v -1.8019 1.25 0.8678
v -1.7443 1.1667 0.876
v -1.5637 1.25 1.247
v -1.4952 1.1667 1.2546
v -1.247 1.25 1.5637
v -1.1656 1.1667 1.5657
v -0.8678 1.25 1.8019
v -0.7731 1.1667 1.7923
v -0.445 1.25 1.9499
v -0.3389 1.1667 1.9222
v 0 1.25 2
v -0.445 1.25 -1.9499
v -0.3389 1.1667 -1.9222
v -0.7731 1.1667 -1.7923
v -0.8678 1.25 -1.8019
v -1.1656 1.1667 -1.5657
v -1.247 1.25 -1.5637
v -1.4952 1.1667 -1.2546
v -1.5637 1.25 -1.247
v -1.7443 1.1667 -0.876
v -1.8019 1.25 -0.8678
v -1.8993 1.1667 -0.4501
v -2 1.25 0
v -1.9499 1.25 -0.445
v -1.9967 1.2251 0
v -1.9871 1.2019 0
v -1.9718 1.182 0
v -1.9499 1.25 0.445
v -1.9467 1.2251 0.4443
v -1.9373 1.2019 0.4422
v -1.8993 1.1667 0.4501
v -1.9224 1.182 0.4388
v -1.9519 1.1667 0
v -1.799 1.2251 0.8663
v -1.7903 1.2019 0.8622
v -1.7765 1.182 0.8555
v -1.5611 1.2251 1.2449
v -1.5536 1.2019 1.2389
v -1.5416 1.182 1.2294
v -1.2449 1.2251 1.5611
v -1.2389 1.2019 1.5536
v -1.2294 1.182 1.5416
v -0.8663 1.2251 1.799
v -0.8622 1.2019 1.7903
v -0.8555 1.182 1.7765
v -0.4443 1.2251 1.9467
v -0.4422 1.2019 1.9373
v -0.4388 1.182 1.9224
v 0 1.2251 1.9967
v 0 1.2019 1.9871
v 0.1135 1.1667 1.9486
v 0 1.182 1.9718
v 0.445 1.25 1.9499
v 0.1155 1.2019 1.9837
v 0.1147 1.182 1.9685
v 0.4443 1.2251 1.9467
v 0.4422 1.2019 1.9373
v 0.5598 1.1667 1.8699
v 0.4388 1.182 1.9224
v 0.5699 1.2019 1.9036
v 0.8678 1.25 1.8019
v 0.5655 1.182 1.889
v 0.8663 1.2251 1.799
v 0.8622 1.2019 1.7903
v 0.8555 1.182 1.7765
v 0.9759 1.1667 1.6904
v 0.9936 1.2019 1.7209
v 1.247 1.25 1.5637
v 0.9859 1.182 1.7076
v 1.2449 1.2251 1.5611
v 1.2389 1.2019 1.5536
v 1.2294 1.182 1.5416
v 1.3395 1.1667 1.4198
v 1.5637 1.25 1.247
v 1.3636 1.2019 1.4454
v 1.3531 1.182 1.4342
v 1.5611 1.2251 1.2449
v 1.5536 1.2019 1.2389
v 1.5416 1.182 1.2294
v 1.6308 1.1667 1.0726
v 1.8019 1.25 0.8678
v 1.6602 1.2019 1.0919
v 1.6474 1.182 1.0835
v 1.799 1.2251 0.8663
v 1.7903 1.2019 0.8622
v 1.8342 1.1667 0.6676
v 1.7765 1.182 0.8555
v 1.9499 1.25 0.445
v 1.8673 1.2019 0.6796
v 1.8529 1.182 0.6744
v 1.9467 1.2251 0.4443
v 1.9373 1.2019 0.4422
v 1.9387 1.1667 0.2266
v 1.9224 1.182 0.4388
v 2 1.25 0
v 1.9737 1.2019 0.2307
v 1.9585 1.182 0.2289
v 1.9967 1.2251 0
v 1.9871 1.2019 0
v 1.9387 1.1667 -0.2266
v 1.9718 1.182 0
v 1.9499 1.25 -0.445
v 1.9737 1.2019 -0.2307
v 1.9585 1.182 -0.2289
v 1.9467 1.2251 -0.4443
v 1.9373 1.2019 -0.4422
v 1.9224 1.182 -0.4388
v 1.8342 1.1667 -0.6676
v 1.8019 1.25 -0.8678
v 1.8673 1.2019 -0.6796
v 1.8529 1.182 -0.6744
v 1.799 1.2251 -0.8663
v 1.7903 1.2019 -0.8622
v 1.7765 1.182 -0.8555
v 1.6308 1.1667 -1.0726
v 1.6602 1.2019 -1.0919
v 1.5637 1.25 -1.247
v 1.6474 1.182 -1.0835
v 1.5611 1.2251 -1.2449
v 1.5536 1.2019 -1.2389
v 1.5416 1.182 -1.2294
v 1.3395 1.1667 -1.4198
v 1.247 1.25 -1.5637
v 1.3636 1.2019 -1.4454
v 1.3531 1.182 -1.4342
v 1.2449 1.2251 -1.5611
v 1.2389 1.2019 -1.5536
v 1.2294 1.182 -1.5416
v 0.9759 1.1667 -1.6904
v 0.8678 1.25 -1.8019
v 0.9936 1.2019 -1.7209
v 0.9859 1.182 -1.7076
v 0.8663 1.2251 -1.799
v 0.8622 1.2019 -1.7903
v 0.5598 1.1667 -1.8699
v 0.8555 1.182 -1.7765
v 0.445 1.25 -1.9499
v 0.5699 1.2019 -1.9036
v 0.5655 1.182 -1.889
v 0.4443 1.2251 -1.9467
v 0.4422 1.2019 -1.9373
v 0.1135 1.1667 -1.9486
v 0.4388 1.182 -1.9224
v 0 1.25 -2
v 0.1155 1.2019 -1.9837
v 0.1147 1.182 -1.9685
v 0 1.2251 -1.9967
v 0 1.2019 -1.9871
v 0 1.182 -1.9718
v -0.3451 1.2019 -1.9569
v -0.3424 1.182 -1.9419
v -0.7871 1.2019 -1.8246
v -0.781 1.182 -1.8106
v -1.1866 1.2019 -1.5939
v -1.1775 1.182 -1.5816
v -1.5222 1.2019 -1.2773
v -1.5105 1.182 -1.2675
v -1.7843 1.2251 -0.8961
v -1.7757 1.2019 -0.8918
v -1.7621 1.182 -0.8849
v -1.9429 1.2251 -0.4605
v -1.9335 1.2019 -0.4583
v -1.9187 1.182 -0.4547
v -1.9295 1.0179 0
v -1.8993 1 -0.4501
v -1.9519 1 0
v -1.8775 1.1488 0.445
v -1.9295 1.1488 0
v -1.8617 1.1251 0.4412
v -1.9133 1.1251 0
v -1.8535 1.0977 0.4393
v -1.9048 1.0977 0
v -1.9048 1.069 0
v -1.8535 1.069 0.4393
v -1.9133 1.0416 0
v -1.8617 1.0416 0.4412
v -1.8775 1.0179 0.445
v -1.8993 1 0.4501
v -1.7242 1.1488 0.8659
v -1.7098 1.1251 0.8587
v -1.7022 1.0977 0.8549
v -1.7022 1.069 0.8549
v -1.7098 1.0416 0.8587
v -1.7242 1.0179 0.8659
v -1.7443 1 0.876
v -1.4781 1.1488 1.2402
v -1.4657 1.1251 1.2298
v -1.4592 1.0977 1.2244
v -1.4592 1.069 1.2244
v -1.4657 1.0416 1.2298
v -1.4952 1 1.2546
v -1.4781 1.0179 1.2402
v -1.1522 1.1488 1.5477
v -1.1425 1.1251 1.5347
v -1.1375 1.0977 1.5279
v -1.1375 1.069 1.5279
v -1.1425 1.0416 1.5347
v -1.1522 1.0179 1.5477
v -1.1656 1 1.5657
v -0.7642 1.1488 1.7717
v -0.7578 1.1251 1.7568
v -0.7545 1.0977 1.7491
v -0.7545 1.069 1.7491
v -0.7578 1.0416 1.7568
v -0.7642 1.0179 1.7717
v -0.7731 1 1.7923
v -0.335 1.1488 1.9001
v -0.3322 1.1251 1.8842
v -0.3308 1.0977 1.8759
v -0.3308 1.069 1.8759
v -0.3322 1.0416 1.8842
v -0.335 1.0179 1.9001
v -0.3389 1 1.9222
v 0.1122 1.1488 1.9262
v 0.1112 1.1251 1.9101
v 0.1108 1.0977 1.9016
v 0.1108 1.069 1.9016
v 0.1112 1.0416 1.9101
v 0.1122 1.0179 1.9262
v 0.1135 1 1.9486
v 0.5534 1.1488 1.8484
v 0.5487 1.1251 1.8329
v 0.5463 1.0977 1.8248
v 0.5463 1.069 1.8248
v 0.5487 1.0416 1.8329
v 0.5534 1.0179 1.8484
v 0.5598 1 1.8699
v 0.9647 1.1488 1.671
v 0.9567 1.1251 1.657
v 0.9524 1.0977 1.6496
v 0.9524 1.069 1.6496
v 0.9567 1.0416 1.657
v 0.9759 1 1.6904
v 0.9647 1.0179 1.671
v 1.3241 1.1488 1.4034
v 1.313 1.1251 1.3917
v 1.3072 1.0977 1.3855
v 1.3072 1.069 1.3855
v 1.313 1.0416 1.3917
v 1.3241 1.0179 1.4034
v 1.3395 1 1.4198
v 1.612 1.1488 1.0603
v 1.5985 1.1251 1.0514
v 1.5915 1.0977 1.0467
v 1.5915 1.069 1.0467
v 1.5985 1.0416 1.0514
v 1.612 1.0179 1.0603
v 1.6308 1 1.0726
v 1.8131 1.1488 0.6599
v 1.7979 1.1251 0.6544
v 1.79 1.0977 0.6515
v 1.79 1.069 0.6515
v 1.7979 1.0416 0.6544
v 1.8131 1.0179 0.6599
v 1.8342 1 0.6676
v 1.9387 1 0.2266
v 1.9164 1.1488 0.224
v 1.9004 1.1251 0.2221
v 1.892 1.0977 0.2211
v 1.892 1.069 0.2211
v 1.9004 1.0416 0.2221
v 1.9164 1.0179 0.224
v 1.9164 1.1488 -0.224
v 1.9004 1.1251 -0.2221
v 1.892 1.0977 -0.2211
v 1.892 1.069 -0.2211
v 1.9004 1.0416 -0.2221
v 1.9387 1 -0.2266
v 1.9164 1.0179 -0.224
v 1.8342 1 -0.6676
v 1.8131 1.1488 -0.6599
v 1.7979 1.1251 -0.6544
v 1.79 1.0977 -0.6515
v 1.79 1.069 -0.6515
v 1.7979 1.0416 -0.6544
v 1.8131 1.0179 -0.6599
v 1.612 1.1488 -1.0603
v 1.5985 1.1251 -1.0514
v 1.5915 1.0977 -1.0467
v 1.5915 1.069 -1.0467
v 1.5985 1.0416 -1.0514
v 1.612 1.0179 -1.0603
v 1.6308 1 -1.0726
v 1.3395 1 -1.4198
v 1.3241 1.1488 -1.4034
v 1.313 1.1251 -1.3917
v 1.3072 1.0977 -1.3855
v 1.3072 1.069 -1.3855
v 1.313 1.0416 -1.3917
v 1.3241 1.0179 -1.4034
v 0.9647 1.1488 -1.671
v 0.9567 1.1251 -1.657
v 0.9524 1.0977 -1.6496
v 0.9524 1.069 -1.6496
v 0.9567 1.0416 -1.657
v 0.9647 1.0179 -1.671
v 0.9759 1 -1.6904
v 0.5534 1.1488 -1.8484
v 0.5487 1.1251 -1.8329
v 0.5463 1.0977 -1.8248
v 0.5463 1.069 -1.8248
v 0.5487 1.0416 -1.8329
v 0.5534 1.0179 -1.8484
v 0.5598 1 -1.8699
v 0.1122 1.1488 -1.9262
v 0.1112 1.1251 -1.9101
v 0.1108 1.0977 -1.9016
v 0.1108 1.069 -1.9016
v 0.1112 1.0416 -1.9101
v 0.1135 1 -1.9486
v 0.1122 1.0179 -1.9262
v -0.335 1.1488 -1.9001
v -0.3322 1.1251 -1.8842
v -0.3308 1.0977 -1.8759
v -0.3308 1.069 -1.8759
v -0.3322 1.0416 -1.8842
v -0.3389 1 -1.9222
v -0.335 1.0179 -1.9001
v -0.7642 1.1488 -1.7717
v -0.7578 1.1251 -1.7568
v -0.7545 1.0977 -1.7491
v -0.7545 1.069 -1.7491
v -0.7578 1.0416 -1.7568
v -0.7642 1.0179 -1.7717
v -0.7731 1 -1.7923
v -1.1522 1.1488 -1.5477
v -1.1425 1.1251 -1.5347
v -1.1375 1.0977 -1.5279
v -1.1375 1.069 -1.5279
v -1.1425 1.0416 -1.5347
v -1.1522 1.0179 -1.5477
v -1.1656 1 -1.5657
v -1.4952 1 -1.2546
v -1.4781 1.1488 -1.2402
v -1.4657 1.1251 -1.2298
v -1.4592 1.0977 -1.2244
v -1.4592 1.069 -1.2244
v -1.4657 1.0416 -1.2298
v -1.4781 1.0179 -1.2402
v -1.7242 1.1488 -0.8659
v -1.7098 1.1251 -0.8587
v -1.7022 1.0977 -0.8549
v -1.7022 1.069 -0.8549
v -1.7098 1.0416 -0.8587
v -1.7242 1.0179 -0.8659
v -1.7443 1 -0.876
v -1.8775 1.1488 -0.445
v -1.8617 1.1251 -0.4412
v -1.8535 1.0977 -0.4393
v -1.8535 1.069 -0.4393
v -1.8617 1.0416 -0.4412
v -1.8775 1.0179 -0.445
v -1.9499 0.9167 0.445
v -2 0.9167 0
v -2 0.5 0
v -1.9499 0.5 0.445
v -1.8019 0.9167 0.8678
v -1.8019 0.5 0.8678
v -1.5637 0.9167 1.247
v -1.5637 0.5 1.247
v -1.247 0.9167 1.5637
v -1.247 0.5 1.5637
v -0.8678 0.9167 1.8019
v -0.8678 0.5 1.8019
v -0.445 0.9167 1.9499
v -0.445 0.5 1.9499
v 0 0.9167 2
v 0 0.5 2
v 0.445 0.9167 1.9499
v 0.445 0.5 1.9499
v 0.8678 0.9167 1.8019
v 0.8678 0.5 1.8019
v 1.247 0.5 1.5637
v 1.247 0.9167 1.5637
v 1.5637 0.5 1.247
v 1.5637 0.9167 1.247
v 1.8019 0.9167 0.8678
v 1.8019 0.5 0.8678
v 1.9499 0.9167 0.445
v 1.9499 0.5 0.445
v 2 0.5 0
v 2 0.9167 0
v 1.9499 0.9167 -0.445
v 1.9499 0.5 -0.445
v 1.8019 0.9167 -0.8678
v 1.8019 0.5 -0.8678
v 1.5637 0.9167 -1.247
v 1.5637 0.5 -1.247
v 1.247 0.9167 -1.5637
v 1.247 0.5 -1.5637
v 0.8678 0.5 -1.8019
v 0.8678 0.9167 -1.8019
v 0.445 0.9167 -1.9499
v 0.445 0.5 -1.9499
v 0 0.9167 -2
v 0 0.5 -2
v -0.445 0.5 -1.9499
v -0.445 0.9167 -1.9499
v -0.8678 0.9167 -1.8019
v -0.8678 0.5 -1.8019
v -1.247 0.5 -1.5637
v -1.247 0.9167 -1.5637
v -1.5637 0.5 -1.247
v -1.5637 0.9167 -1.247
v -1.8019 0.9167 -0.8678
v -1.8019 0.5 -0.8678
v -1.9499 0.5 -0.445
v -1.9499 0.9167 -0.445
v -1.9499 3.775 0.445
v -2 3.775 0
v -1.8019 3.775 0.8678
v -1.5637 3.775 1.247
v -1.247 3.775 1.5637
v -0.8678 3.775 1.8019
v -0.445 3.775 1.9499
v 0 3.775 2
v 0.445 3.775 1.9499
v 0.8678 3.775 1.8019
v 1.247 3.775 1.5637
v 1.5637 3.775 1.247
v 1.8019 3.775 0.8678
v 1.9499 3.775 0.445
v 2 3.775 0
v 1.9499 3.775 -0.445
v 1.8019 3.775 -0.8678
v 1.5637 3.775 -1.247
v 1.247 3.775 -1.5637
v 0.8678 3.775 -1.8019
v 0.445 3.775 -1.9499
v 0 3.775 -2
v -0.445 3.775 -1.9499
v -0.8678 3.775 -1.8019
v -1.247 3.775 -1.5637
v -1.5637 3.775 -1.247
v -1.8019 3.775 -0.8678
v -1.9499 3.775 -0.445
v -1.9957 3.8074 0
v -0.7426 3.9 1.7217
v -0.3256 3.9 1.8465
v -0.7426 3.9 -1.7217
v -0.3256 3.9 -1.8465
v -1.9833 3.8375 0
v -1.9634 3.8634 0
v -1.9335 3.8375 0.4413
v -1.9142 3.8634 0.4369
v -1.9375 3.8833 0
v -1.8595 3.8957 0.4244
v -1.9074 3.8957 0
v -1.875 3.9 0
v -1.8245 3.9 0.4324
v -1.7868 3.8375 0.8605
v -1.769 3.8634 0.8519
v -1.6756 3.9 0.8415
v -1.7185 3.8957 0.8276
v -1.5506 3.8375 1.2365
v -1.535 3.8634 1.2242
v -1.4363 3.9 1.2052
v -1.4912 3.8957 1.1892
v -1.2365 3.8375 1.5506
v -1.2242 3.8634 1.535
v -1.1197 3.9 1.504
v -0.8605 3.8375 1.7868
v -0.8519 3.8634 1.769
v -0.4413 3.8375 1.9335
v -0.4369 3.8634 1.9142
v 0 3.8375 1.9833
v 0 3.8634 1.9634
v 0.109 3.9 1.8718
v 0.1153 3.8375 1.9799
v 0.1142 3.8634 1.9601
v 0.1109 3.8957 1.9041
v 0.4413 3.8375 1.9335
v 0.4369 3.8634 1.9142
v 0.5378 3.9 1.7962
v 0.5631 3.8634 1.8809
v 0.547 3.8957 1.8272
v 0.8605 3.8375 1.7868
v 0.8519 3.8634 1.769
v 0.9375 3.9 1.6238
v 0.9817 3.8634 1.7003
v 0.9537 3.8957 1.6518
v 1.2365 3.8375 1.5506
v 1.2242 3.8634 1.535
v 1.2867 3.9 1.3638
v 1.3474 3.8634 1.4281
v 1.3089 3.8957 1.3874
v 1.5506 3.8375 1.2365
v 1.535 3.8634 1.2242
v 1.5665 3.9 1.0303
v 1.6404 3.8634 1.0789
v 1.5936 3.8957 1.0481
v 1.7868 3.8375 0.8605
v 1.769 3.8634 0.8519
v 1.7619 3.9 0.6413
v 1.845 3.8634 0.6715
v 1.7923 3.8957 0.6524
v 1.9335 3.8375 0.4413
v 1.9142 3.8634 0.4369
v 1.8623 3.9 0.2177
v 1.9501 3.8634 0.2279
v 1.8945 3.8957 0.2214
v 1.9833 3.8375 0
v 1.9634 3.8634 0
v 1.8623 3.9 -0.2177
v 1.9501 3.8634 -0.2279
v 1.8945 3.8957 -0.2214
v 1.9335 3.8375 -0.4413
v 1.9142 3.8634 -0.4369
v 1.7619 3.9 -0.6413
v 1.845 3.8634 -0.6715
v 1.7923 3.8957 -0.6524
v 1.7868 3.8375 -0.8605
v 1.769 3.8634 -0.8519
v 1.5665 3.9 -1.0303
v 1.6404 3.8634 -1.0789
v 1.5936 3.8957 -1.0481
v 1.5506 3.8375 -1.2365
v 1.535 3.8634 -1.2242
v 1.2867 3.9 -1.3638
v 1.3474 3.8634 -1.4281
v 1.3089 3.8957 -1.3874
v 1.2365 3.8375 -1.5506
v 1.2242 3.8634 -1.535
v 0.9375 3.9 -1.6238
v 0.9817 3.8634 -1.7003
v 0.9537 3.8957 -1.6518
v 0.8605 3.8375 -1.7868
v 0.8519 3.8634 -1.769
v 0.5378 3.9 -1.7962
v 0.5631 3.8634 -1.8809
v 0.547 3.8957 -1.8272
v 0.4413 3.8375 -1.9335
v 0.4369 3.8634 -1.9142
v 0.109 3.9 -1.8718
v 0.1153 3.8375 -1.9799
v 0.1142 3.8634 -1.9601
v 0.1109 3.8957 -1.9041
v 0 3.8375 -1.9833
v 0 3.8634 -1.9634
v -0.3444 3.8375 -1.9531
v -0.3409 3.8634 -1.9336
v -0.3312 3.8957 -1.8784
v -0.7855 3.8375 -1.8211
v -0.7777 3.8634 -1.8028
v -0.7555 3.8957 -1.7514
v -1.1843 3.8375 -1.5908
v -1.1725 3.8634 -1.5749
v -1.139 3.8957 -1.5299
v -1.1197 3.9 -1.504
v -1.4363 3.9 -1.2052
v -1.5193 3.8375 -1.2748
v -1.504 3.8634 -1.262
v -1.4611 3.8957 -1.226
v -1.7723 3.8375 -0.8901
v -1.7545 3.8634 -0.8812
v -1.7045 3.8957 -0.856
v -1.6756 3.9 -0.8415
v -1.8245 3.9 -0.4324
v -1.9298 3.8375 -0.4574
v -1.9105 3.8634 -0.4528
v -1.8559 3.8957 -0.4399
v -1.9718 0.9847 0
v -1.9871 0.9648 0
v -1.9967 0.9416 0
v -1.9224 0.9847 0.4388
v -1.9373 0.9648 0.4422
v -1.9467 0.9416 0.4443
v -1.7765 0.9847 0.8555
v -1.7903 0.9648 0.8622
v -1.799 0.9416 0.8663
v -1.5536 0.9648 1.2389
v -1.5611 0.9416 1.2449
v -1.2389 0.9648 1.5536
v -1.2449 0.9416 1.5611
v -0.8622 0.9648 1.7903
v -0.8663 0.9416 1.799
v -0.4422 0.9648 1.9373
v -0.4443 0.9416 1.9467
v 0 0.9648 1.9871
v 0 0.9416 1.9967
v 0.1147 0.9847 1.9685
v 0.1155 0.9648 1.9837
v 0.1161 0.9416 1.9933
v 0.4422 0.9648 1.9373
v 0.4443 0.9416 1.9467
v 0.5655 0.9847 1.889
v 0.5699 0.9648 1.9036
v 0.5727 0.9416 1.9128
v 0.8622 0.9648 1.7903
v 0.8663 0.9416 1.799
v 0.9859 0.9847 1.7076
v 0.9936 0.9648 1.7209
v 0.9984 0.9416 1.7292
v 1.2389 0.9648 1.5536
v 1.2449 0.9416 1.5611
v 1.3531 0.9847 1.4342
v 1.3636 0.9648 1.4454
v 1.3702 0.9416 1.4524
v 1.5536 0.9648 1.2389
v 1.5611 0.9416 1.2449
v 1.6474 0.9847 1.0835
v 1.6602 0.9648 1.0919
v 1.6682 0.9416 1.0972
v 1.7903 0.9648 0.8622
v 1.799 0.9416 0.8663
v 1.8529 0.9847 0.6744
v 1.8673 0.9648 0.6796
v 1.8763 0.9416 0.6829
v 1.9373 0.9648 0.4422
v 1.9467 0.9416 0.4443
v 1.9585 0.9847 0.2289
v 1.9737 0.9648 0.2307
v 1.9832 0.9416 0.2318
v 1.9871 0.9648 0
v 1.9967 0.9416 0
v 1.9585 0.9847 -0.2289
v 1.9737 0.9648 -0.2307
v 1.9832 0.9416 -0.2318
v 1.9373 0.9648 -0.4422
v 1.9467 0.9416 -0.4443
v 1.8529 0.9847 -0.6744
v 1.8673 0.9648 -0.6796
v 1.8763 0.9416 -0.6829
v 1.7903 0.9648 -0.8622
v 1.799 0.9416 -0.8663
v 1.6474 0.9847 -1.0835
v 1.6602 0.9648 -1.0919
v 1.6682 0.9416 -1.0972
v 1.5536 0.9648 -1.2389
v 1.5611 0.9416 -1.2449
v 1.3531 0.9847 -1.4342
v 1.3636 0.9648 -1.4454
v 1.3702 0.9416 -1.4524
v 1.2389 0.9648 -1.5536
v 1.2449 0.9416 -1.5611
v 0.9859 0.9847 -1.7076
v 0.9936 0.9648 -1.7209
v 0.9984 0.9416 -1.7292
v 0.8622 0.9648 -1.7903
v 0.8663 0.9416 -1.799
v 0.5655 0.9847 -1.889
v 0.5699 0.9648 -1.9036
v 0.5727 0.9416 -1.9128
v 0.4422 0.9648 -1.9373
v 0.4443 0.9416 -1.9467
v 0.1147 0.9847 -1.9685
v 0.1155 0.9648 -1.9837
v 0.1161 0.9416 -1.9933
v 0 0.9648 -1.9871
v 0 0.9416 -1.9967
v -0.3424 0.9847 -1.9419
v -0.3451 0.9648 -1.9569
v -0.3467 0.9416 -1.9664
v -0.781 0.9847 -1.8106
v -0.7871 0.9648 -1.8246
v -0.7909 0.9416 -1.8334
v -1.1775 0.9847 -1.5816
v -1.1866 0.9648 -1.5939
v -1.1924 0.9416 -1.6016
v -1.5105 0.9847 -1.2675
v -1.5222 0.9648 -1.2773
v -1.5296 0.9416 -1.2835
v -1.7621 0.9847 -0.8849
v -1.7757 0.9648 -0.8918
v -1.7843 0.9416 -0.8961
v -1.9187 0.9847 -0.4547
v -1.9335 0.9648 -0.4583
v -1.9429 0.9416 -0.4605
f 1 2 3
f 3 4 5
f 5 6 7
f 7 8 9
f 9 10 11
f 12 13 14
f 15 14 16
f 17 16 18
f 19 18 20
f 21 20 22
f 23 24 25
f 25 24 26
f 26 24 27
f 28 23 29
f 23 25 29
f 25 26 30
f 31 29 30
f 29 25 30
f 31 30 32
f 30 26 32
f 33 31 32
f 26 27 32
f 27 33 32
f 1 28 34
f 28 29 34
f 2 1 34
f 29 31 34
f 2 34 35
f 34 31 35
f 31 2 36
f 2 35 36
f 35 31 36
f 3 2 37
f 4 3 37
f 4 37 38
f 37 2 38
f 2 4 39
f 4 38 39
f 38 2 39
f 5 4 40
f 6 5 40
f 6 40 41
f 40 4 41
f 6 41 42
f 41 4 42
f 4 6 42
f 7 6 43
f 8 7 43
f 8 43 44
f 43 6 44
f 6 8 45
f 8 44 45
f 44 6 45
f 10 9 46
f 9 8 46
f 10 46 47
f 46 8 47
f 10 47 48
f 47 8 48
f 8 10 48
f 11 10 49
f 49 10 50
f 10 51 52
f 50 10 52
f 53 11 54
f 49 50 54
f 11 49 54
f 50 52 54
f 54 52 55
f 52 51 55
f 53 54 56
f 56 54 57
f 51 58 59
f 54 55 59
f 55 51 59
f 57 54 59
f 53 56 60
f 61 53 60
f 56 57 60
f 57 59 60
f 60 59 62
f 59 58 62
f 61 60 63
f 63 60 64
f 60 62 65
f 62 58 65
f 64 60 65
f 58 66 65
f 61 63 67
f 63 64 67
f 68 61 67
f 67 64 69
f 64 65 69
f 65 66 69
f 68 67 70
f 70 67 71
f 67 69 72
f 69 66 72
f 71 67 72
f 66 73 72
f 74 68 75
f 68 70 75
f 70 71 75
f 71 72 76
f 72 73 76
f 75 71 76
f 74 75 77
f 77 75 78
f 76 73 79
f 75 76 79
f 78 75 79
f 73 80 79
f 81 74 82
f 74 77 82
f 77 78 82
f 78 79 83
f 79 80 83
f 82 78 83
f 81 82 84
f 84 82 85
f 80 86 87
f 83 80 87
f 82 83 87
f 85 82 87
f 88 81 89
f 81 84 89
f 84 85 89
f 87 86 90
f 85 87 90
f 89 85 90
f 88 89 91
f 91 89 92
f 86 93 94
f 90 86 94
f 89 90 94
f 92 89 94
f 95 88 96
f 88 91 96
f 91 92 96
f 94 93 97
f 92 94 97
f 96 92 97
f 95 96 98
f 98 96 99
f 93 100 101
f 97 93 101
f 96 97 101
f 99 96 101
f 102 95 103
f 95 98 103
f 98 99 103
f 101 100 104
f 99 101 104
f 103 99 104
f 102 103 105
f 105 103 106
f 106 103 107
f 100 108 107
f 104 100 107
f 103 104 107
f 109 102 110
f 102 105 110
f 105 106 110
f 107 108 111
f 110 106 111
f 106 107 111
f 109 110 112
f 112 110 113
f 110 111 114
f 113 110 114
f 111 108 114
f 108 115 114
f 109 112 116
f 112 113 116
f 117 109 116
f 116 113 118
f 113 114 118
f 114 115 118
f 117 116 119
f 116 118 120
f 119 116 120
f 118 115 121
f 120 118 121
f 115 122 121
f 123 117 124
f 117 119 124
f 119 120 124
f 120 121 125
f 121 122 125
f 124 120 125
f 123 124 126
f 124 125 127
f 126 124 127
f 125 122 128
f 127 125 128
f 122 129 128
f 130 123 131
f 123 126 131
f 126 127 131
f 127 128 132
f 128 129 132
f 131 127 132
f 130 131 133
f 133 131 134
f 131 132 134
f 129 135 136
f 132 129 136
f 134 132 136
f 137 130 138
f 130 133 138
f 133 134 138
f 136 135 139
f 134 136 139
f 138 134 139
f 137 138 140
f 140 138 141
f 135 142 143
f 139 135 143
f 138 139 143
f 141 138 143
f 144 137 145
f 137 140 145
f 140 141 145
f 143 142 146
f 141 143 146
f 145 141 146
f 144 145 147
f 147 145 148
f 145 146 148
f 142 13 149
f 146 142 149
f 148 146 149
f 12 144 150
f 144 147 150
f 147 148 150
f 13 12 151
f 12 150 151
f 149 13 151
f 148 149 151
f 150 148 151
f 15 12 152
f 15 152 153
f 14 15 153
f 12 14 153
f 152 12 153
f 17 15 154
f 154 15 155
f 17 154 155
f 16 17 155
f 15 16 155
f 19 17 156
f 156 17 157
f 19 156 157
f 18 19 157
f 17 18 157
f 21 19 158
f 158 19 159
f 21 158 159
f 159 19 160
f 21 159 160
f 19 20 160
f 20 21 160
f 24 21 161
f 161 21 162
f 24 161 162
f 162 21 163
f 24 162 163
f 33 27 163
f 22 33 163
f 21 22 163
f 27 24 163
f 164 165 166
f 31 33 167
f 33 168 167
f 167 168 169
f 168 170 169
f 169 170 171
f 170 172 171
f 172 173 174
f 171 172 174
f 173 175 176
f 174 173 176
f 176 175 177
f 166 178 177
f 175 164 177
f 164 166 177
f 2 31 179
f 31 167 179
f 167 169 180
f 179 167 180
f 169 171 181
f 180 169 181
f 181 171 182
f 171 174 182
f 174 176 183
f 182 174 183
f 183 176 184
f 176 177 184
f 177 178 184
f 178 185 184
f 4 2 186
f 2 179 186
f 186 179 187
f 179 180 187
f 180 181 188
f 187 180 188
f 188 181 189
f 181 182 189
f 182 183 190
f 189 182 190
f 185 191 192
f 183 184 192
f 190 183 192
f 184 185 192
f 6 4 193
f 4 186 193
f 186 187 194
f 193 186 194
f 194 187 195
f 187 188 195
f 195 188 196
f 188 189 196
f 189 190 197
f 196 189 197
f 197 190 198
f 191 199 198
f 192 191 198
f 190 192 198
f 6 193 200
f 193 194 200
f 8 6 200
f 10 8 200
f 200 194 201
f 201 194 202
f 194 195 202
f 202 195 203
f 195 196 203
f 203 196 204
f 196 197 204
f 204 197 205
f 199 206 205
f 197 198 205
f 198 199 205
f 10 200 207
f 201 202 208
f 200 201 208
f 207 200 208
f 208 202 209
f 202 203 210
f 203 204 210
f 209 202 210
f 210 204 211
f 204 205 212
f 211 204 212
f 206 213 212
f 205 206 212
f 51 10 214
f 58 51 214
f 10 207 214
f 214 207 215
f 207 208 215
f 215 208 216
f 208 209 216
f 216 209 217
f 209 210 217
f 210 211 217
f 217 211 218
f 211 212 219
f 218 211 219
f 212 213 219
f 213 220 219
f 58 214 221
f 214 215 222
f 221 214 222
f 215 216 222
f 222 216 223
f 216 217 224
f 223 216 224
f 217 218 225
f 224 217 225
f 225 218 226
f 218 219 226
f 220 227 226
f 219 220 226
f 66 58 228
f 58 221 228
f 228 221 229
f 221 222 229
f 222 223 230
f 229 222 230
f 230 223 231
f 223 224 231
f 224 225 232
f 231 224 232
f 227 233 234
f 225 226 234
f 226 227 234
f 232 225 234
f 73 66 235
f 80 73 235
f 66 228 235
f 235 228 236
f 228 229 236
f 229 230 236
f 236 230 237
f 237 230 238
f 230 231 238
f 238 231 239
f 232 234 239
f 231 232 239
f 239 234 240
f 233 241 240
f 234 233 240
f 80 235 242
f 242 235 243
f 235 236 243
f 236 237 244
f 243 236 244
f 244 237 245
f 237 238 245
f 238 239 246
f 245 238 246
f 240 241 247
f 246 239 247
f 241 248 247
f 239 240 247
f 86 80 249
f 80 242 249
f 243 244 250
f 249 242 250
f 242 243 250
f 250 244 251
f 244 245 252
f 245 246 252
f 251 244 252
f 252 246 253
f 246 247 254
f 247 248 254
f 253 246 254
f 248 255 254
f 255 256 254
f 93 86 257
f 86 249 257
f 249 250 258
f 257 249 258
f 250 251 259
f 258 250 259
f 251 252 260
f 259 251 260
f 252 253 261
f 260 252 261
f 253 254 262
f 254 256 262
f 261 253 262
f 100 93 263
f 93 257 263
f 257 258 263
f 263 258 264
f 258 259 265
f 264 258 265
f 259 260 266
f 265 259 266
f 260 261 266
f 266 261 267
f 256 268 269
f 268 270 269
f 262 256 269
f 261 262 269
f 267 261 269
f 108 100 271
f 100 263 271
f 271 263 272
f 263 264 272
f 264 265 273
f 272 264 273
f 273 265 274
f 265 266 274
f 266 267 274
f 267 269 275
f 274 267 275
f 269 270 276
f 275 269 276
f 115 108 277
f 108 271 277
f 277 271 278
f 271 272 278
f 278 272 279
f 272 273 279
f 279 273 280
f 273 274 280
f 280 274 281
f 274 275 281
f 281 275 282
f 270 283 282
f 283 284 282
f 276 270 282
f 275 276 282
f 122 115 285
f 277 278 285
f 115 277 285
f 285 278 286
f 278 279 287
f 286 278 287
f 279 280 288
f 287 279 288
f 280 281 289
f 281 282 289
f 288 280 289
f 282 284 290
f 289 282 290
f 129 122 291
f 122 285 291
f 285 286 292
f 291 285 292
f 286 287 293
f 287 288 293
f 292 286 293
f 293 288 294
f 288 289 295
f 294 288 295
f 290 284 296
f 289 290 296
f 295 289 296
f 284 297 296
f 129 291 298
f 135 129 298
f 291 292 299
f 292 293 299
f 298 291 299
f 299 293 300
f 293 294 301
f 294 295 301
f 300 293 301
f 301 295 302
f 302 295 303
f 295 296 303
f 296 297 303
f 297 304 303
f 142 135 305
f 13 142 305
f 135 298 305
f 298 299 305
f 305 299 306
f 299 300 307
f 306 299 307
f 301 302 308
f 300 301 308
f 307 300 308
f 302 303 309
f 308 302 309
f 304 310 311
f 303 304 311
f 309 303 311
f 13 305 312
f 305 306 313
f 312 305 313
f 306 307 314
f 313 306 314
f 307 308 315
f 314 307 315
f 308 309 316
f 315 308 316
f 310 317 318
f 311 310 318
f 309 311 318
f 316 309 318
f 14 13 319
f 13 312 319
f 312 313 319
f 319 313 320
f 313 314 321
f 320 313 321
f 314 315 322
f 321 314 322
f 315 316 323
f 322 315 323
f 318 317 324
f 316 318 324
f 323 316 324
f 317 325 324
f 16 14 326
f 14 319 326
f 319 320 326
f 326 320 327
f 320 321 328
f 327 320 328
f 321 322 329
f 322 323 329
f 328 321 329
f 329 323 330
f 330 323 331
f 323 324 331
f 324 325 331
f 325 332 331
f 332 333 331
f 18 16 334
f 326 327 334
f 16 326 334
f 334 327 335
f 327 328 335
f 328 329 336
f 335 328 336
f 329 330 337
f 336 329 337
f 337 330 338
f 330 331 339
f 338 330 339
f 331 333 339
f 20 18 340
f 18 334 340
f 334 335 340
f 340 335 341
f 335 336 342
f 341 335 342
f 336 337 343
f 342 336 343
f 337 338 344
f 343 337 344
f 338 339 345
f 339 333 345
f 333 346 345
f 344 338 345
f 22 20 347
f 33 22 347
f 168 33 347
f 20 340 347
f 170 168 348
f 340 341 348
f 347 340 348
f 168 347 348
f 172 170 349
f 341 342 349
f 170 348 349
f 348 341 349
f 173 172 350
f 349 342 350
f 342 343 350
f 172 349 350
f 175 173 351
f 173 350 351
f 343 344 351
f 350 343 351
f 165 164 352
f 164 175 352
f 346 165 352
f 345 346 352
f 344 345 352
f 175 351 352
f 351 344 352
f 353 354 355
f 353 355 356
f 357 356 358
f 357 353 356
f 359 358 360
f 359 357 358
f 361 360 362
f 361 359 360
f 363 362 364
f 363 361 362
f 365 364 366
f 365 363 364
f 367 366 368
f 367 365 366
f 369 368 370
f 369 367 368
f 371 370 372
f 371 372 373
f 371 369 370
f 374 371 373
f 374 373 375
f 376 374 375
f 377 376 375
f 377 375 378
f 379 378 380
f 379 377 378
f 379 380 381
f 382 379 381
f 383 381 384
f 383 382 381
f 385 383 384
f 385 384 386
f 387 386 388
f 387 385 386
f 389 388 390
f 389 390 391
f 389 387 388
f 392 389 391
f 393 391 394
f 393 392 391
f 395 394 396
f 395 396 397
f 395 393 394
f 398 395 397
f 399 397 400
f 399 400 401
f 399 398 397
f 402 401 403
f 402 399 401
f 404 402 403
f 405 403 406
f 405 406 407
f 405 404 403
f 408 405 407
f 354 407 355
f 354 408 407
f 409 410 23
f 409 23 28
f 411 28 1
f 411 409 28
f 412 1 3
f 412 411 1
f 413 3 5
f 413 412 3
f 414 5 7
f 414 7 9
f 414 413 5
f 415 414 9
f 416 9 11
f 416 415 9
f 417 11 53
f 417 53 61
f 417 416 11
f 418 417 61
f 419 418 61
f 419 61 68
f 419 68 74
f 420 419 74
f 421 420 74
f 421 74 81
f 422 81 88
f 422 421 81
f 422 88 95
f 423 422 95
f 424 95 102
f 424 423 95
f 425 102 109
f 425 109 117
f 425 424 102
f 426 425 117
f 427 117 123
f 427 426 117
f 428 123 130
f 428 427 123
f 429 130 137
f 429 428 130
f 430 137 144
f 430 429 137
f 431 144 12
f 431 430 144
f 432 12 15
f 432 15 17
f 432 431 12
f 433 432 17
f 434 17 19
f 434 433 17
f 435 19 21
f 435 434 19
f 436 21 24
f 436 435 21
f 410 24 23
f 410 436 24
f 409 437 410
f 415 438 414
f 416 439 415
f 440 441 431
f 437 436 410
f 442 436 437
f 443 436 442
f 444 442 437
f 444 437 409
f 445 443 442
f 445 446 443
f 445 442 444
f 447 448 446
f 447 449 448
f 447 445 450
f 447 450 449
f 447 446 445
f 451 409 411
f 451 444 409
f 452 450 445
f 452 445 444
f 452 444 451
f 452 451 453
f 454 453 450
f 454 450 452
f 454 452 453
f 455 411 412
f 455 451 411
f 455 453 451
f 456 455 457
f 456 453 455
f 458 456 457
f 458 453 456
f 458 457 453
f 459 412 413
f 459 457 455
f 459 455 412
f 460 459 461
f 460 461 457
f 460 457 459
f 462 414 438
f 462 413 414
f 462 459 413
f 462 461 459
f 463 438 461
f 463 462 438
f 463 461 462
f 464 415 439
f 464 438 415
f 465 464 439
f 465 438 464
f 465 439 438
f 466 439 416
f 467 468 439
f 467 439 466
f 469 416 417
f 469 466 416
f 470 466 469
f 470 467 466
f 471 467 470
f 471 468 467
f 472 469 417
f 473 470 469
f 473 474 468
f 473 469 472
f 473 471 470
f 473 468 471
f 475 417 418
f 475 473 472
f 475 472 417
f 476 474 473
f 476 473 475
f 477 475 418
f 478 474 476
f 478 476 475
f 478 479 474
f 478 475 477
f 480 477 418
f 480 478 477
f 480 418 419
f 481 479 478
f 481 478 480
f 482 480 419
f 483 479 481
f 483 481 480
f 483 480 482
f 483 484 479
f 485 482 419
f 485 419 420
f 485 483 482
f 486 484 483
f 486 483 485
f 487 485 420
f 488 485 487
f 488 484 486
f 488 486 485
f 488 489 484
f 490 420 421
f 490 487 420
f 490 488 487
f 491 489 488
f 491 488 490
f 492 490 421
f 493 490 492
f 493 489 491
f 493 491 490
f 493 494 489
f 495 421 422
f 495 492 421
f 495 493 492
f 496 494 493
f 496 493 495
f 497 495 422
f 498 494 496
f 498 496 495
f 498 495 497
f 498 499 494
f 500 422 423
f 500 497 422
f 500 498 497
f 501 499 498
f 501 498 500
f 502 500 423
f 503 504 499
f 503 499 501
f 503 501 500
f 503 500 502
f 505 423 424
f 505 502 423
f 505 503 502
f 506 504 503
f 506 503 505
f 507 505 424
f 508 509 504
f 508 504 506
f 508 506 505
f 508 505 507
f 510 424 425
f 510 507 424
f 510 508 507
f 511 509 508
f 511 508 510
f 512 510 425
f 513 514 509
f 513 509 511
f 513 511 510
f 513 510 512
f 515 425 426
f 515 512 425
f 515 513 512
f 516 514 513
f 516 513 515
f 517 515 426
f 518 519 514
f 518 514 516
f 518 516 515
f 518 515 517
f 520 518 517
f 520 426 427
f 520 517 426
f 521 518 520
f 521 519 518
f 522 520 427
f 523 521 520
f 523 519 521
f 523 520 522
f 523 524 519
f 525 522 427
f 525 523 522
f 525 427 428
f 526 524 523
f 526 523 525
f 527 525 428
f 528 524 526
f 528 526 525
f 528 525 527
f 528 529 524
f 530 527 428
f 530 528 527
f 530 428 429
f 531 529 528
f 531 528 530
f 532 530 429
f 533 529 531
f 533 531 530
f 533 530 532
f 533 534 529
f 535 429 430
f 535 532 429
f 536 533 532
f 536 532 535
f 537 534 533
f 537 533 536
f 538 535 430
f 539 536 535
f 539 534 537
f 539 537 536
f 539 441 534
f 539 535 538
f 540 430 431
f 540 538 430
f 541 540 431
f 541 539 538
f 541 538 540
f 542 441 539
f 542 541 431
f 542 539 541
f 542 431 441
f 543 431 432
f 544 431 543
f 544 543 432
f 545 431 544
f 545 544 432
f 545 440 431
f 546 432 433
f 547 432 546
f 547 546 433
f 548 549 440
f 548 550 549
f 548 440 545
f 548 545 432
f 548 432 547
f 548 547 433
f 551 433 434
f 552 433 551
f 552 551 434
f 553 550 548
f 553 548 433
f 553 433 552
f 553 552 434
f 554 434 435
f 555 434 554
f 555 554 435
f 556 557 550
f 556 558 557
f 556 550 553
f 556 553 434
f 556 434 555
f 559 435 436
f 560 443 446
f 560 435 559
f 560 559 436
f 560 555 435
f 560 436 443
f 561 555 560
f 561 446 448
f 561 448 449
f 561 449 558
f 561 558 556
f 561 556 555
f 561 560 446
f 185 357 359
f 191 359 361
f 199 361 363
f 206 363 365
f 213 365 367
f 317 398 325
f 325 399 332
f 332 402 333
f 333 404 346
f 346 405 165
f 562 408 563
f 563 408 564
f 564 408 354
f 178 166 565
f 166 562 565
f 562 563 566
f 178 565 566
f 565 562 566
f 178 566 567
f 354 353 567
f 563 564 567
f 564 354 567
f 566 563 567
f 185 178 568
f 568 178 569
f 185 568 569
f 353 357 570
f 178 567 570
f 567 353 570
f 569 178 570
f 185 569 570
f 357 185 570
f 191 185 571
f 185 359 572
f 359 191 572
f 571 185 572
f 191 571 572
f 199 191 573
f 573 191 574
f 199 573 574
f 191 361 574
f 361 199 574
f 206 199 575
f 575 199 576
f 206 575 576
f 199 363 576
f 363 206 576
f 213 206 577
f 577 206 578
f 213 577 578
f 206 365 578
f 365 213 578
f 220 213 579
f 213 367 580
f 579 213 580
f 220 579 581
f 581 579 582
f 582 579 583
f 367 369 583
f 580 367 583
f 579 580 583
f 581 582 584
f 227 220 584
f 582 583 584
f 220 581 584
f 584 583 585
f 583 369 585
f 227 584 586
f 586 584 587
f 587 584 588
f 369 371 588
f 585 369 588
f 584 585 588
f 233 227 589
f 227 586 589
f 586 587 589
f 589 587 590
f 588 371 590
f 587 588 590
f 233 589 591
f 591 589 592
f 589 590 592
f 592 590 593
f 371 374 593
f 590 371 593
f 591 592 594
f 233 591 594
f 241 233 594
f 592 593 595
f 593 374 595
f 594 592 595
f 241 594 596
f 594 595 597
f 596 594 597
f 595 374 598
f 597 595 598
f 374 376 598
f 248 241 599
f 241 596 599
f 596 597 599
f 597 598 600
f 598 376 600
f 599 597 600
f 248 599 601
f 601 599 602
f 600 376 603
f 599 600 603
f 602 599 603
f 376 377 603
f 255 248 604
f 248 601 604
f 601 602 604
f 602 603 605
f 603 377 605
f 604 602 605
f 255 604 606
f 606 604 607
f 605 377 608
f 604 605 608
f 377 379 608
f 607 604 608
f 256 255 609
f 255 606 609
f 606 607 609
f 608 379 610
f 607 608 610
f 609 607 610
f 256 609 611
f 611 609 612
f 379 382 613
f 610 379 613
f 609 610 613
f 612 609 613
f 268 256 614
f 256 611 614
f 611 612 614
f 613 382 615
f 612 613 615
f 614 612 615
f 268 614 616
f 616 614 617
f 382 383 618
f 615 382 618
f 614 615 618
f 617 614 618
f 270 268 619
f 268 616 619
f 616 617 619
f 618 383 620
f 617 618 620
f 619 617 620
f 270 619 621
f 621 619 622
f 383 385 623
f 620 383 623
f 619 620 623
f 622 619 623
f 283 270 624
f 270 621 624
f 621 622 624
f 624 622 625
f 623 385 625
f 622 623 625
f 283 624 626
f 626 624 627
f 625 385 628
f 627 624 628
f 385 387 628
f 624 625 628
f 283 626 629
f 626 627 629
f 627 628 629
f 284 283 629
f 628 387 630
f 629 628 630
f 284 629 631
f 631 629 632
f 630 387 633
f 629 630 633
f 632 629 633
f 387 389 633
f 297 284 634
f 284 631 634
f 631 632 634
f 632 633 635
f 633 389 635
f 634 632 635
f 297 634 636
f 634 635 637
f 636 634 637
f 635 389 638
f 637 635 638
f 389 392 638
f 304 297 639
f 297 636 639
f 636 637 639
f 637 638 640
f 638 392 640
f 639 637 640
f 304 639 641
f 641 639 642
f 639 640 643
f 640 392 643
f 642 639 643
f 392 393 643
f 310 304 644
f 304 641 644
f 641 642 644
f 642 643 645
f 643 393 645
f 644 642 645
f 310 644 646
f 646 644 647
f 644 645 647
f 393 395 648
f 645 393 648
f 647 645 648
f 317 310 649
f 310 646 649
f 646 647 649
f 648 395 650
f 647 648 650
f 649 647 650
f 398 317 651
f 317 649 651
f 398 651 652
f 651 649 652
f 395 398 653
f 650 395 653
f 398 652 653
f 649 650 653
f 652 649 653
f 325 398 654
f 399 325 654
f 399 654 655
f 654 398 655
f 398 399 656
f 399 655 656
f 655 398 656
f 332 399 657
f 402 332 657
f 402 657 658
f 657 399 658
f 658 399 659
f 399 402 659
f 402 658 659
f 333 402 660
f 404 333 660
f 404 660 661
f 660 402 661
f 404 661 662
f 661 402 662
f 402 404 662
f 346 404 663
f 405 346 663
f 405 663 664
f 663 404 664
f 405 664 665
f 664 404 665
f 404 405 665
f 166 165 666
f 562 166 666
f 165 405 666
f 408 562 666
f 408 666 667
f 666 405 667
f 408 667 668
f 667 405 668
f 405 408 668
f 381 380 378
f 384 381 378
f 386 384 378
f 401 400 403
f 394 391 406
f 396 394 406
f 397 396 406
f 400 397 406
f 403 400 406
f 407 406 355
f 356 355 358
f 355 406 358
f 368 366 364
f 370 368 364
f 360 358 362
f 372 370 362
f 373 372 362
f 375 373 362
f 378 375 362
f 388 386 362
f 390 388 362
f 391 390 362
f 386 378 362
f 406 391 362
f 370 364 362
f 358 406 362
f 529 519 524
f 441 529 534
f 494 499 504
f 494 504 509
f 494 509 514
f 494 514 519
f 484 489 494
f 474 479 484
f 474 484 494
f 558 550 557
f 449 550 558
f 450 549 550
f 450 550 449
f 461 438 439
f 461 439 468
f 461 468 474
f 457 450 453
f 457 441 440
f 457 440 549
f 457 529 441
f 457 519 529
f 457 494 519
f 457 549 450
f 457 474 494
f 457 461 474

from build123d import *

# Parameters (mm, degrees)
CROQUIS1_W  = 2
CROQUIS1_H  = 3.4
REDONDEO1_R = 0.125


with BuildPart() as part:
    # Croquis1 → Revolución1 (revolve)
    with BuildSketch(Plane.XY):
        with Locations((-1, 2.2)):
            Rectangle(CROQUIS1_W, CROQUIS1_H)
    revolve(axis=Axis((0, 0.5, 0), (0, 1, 0)))

    # Croquis3 → Cortar-Revolución1 (revolve, cut)
    with BuildSketch(Plane.XY):
        with BuildLine():
            Line((-2, 0.916666667), (-2, 1.25))
            ThreePointArc((-2, 1.25), (-1.987108288, 1.201887478), (-1.951887478, 1.166666667))
            ThreePointArc((-1.951887478, 1.166666667), (-1.903774955, 1.083333333), (-1.951887478, 1))
            ThreePointArc((-1.951887478, 1), (-1.987108288, 0.964779189), (-2, 0.916666667))
        make_face()
    revolve(axis=Axis((0, -0.168697536, 0), (0, 1, 0)), mode=Mode.SUBTRACT)

    # Redondeo1
    redondeo1_edges = [part.edges().sort_by_distance(p)[0] for p in [
        (2, 3.9, 0),
    ]]
    fillet(redondeo1_edges, radius=REDONDEO1_R)


solid = part.part
